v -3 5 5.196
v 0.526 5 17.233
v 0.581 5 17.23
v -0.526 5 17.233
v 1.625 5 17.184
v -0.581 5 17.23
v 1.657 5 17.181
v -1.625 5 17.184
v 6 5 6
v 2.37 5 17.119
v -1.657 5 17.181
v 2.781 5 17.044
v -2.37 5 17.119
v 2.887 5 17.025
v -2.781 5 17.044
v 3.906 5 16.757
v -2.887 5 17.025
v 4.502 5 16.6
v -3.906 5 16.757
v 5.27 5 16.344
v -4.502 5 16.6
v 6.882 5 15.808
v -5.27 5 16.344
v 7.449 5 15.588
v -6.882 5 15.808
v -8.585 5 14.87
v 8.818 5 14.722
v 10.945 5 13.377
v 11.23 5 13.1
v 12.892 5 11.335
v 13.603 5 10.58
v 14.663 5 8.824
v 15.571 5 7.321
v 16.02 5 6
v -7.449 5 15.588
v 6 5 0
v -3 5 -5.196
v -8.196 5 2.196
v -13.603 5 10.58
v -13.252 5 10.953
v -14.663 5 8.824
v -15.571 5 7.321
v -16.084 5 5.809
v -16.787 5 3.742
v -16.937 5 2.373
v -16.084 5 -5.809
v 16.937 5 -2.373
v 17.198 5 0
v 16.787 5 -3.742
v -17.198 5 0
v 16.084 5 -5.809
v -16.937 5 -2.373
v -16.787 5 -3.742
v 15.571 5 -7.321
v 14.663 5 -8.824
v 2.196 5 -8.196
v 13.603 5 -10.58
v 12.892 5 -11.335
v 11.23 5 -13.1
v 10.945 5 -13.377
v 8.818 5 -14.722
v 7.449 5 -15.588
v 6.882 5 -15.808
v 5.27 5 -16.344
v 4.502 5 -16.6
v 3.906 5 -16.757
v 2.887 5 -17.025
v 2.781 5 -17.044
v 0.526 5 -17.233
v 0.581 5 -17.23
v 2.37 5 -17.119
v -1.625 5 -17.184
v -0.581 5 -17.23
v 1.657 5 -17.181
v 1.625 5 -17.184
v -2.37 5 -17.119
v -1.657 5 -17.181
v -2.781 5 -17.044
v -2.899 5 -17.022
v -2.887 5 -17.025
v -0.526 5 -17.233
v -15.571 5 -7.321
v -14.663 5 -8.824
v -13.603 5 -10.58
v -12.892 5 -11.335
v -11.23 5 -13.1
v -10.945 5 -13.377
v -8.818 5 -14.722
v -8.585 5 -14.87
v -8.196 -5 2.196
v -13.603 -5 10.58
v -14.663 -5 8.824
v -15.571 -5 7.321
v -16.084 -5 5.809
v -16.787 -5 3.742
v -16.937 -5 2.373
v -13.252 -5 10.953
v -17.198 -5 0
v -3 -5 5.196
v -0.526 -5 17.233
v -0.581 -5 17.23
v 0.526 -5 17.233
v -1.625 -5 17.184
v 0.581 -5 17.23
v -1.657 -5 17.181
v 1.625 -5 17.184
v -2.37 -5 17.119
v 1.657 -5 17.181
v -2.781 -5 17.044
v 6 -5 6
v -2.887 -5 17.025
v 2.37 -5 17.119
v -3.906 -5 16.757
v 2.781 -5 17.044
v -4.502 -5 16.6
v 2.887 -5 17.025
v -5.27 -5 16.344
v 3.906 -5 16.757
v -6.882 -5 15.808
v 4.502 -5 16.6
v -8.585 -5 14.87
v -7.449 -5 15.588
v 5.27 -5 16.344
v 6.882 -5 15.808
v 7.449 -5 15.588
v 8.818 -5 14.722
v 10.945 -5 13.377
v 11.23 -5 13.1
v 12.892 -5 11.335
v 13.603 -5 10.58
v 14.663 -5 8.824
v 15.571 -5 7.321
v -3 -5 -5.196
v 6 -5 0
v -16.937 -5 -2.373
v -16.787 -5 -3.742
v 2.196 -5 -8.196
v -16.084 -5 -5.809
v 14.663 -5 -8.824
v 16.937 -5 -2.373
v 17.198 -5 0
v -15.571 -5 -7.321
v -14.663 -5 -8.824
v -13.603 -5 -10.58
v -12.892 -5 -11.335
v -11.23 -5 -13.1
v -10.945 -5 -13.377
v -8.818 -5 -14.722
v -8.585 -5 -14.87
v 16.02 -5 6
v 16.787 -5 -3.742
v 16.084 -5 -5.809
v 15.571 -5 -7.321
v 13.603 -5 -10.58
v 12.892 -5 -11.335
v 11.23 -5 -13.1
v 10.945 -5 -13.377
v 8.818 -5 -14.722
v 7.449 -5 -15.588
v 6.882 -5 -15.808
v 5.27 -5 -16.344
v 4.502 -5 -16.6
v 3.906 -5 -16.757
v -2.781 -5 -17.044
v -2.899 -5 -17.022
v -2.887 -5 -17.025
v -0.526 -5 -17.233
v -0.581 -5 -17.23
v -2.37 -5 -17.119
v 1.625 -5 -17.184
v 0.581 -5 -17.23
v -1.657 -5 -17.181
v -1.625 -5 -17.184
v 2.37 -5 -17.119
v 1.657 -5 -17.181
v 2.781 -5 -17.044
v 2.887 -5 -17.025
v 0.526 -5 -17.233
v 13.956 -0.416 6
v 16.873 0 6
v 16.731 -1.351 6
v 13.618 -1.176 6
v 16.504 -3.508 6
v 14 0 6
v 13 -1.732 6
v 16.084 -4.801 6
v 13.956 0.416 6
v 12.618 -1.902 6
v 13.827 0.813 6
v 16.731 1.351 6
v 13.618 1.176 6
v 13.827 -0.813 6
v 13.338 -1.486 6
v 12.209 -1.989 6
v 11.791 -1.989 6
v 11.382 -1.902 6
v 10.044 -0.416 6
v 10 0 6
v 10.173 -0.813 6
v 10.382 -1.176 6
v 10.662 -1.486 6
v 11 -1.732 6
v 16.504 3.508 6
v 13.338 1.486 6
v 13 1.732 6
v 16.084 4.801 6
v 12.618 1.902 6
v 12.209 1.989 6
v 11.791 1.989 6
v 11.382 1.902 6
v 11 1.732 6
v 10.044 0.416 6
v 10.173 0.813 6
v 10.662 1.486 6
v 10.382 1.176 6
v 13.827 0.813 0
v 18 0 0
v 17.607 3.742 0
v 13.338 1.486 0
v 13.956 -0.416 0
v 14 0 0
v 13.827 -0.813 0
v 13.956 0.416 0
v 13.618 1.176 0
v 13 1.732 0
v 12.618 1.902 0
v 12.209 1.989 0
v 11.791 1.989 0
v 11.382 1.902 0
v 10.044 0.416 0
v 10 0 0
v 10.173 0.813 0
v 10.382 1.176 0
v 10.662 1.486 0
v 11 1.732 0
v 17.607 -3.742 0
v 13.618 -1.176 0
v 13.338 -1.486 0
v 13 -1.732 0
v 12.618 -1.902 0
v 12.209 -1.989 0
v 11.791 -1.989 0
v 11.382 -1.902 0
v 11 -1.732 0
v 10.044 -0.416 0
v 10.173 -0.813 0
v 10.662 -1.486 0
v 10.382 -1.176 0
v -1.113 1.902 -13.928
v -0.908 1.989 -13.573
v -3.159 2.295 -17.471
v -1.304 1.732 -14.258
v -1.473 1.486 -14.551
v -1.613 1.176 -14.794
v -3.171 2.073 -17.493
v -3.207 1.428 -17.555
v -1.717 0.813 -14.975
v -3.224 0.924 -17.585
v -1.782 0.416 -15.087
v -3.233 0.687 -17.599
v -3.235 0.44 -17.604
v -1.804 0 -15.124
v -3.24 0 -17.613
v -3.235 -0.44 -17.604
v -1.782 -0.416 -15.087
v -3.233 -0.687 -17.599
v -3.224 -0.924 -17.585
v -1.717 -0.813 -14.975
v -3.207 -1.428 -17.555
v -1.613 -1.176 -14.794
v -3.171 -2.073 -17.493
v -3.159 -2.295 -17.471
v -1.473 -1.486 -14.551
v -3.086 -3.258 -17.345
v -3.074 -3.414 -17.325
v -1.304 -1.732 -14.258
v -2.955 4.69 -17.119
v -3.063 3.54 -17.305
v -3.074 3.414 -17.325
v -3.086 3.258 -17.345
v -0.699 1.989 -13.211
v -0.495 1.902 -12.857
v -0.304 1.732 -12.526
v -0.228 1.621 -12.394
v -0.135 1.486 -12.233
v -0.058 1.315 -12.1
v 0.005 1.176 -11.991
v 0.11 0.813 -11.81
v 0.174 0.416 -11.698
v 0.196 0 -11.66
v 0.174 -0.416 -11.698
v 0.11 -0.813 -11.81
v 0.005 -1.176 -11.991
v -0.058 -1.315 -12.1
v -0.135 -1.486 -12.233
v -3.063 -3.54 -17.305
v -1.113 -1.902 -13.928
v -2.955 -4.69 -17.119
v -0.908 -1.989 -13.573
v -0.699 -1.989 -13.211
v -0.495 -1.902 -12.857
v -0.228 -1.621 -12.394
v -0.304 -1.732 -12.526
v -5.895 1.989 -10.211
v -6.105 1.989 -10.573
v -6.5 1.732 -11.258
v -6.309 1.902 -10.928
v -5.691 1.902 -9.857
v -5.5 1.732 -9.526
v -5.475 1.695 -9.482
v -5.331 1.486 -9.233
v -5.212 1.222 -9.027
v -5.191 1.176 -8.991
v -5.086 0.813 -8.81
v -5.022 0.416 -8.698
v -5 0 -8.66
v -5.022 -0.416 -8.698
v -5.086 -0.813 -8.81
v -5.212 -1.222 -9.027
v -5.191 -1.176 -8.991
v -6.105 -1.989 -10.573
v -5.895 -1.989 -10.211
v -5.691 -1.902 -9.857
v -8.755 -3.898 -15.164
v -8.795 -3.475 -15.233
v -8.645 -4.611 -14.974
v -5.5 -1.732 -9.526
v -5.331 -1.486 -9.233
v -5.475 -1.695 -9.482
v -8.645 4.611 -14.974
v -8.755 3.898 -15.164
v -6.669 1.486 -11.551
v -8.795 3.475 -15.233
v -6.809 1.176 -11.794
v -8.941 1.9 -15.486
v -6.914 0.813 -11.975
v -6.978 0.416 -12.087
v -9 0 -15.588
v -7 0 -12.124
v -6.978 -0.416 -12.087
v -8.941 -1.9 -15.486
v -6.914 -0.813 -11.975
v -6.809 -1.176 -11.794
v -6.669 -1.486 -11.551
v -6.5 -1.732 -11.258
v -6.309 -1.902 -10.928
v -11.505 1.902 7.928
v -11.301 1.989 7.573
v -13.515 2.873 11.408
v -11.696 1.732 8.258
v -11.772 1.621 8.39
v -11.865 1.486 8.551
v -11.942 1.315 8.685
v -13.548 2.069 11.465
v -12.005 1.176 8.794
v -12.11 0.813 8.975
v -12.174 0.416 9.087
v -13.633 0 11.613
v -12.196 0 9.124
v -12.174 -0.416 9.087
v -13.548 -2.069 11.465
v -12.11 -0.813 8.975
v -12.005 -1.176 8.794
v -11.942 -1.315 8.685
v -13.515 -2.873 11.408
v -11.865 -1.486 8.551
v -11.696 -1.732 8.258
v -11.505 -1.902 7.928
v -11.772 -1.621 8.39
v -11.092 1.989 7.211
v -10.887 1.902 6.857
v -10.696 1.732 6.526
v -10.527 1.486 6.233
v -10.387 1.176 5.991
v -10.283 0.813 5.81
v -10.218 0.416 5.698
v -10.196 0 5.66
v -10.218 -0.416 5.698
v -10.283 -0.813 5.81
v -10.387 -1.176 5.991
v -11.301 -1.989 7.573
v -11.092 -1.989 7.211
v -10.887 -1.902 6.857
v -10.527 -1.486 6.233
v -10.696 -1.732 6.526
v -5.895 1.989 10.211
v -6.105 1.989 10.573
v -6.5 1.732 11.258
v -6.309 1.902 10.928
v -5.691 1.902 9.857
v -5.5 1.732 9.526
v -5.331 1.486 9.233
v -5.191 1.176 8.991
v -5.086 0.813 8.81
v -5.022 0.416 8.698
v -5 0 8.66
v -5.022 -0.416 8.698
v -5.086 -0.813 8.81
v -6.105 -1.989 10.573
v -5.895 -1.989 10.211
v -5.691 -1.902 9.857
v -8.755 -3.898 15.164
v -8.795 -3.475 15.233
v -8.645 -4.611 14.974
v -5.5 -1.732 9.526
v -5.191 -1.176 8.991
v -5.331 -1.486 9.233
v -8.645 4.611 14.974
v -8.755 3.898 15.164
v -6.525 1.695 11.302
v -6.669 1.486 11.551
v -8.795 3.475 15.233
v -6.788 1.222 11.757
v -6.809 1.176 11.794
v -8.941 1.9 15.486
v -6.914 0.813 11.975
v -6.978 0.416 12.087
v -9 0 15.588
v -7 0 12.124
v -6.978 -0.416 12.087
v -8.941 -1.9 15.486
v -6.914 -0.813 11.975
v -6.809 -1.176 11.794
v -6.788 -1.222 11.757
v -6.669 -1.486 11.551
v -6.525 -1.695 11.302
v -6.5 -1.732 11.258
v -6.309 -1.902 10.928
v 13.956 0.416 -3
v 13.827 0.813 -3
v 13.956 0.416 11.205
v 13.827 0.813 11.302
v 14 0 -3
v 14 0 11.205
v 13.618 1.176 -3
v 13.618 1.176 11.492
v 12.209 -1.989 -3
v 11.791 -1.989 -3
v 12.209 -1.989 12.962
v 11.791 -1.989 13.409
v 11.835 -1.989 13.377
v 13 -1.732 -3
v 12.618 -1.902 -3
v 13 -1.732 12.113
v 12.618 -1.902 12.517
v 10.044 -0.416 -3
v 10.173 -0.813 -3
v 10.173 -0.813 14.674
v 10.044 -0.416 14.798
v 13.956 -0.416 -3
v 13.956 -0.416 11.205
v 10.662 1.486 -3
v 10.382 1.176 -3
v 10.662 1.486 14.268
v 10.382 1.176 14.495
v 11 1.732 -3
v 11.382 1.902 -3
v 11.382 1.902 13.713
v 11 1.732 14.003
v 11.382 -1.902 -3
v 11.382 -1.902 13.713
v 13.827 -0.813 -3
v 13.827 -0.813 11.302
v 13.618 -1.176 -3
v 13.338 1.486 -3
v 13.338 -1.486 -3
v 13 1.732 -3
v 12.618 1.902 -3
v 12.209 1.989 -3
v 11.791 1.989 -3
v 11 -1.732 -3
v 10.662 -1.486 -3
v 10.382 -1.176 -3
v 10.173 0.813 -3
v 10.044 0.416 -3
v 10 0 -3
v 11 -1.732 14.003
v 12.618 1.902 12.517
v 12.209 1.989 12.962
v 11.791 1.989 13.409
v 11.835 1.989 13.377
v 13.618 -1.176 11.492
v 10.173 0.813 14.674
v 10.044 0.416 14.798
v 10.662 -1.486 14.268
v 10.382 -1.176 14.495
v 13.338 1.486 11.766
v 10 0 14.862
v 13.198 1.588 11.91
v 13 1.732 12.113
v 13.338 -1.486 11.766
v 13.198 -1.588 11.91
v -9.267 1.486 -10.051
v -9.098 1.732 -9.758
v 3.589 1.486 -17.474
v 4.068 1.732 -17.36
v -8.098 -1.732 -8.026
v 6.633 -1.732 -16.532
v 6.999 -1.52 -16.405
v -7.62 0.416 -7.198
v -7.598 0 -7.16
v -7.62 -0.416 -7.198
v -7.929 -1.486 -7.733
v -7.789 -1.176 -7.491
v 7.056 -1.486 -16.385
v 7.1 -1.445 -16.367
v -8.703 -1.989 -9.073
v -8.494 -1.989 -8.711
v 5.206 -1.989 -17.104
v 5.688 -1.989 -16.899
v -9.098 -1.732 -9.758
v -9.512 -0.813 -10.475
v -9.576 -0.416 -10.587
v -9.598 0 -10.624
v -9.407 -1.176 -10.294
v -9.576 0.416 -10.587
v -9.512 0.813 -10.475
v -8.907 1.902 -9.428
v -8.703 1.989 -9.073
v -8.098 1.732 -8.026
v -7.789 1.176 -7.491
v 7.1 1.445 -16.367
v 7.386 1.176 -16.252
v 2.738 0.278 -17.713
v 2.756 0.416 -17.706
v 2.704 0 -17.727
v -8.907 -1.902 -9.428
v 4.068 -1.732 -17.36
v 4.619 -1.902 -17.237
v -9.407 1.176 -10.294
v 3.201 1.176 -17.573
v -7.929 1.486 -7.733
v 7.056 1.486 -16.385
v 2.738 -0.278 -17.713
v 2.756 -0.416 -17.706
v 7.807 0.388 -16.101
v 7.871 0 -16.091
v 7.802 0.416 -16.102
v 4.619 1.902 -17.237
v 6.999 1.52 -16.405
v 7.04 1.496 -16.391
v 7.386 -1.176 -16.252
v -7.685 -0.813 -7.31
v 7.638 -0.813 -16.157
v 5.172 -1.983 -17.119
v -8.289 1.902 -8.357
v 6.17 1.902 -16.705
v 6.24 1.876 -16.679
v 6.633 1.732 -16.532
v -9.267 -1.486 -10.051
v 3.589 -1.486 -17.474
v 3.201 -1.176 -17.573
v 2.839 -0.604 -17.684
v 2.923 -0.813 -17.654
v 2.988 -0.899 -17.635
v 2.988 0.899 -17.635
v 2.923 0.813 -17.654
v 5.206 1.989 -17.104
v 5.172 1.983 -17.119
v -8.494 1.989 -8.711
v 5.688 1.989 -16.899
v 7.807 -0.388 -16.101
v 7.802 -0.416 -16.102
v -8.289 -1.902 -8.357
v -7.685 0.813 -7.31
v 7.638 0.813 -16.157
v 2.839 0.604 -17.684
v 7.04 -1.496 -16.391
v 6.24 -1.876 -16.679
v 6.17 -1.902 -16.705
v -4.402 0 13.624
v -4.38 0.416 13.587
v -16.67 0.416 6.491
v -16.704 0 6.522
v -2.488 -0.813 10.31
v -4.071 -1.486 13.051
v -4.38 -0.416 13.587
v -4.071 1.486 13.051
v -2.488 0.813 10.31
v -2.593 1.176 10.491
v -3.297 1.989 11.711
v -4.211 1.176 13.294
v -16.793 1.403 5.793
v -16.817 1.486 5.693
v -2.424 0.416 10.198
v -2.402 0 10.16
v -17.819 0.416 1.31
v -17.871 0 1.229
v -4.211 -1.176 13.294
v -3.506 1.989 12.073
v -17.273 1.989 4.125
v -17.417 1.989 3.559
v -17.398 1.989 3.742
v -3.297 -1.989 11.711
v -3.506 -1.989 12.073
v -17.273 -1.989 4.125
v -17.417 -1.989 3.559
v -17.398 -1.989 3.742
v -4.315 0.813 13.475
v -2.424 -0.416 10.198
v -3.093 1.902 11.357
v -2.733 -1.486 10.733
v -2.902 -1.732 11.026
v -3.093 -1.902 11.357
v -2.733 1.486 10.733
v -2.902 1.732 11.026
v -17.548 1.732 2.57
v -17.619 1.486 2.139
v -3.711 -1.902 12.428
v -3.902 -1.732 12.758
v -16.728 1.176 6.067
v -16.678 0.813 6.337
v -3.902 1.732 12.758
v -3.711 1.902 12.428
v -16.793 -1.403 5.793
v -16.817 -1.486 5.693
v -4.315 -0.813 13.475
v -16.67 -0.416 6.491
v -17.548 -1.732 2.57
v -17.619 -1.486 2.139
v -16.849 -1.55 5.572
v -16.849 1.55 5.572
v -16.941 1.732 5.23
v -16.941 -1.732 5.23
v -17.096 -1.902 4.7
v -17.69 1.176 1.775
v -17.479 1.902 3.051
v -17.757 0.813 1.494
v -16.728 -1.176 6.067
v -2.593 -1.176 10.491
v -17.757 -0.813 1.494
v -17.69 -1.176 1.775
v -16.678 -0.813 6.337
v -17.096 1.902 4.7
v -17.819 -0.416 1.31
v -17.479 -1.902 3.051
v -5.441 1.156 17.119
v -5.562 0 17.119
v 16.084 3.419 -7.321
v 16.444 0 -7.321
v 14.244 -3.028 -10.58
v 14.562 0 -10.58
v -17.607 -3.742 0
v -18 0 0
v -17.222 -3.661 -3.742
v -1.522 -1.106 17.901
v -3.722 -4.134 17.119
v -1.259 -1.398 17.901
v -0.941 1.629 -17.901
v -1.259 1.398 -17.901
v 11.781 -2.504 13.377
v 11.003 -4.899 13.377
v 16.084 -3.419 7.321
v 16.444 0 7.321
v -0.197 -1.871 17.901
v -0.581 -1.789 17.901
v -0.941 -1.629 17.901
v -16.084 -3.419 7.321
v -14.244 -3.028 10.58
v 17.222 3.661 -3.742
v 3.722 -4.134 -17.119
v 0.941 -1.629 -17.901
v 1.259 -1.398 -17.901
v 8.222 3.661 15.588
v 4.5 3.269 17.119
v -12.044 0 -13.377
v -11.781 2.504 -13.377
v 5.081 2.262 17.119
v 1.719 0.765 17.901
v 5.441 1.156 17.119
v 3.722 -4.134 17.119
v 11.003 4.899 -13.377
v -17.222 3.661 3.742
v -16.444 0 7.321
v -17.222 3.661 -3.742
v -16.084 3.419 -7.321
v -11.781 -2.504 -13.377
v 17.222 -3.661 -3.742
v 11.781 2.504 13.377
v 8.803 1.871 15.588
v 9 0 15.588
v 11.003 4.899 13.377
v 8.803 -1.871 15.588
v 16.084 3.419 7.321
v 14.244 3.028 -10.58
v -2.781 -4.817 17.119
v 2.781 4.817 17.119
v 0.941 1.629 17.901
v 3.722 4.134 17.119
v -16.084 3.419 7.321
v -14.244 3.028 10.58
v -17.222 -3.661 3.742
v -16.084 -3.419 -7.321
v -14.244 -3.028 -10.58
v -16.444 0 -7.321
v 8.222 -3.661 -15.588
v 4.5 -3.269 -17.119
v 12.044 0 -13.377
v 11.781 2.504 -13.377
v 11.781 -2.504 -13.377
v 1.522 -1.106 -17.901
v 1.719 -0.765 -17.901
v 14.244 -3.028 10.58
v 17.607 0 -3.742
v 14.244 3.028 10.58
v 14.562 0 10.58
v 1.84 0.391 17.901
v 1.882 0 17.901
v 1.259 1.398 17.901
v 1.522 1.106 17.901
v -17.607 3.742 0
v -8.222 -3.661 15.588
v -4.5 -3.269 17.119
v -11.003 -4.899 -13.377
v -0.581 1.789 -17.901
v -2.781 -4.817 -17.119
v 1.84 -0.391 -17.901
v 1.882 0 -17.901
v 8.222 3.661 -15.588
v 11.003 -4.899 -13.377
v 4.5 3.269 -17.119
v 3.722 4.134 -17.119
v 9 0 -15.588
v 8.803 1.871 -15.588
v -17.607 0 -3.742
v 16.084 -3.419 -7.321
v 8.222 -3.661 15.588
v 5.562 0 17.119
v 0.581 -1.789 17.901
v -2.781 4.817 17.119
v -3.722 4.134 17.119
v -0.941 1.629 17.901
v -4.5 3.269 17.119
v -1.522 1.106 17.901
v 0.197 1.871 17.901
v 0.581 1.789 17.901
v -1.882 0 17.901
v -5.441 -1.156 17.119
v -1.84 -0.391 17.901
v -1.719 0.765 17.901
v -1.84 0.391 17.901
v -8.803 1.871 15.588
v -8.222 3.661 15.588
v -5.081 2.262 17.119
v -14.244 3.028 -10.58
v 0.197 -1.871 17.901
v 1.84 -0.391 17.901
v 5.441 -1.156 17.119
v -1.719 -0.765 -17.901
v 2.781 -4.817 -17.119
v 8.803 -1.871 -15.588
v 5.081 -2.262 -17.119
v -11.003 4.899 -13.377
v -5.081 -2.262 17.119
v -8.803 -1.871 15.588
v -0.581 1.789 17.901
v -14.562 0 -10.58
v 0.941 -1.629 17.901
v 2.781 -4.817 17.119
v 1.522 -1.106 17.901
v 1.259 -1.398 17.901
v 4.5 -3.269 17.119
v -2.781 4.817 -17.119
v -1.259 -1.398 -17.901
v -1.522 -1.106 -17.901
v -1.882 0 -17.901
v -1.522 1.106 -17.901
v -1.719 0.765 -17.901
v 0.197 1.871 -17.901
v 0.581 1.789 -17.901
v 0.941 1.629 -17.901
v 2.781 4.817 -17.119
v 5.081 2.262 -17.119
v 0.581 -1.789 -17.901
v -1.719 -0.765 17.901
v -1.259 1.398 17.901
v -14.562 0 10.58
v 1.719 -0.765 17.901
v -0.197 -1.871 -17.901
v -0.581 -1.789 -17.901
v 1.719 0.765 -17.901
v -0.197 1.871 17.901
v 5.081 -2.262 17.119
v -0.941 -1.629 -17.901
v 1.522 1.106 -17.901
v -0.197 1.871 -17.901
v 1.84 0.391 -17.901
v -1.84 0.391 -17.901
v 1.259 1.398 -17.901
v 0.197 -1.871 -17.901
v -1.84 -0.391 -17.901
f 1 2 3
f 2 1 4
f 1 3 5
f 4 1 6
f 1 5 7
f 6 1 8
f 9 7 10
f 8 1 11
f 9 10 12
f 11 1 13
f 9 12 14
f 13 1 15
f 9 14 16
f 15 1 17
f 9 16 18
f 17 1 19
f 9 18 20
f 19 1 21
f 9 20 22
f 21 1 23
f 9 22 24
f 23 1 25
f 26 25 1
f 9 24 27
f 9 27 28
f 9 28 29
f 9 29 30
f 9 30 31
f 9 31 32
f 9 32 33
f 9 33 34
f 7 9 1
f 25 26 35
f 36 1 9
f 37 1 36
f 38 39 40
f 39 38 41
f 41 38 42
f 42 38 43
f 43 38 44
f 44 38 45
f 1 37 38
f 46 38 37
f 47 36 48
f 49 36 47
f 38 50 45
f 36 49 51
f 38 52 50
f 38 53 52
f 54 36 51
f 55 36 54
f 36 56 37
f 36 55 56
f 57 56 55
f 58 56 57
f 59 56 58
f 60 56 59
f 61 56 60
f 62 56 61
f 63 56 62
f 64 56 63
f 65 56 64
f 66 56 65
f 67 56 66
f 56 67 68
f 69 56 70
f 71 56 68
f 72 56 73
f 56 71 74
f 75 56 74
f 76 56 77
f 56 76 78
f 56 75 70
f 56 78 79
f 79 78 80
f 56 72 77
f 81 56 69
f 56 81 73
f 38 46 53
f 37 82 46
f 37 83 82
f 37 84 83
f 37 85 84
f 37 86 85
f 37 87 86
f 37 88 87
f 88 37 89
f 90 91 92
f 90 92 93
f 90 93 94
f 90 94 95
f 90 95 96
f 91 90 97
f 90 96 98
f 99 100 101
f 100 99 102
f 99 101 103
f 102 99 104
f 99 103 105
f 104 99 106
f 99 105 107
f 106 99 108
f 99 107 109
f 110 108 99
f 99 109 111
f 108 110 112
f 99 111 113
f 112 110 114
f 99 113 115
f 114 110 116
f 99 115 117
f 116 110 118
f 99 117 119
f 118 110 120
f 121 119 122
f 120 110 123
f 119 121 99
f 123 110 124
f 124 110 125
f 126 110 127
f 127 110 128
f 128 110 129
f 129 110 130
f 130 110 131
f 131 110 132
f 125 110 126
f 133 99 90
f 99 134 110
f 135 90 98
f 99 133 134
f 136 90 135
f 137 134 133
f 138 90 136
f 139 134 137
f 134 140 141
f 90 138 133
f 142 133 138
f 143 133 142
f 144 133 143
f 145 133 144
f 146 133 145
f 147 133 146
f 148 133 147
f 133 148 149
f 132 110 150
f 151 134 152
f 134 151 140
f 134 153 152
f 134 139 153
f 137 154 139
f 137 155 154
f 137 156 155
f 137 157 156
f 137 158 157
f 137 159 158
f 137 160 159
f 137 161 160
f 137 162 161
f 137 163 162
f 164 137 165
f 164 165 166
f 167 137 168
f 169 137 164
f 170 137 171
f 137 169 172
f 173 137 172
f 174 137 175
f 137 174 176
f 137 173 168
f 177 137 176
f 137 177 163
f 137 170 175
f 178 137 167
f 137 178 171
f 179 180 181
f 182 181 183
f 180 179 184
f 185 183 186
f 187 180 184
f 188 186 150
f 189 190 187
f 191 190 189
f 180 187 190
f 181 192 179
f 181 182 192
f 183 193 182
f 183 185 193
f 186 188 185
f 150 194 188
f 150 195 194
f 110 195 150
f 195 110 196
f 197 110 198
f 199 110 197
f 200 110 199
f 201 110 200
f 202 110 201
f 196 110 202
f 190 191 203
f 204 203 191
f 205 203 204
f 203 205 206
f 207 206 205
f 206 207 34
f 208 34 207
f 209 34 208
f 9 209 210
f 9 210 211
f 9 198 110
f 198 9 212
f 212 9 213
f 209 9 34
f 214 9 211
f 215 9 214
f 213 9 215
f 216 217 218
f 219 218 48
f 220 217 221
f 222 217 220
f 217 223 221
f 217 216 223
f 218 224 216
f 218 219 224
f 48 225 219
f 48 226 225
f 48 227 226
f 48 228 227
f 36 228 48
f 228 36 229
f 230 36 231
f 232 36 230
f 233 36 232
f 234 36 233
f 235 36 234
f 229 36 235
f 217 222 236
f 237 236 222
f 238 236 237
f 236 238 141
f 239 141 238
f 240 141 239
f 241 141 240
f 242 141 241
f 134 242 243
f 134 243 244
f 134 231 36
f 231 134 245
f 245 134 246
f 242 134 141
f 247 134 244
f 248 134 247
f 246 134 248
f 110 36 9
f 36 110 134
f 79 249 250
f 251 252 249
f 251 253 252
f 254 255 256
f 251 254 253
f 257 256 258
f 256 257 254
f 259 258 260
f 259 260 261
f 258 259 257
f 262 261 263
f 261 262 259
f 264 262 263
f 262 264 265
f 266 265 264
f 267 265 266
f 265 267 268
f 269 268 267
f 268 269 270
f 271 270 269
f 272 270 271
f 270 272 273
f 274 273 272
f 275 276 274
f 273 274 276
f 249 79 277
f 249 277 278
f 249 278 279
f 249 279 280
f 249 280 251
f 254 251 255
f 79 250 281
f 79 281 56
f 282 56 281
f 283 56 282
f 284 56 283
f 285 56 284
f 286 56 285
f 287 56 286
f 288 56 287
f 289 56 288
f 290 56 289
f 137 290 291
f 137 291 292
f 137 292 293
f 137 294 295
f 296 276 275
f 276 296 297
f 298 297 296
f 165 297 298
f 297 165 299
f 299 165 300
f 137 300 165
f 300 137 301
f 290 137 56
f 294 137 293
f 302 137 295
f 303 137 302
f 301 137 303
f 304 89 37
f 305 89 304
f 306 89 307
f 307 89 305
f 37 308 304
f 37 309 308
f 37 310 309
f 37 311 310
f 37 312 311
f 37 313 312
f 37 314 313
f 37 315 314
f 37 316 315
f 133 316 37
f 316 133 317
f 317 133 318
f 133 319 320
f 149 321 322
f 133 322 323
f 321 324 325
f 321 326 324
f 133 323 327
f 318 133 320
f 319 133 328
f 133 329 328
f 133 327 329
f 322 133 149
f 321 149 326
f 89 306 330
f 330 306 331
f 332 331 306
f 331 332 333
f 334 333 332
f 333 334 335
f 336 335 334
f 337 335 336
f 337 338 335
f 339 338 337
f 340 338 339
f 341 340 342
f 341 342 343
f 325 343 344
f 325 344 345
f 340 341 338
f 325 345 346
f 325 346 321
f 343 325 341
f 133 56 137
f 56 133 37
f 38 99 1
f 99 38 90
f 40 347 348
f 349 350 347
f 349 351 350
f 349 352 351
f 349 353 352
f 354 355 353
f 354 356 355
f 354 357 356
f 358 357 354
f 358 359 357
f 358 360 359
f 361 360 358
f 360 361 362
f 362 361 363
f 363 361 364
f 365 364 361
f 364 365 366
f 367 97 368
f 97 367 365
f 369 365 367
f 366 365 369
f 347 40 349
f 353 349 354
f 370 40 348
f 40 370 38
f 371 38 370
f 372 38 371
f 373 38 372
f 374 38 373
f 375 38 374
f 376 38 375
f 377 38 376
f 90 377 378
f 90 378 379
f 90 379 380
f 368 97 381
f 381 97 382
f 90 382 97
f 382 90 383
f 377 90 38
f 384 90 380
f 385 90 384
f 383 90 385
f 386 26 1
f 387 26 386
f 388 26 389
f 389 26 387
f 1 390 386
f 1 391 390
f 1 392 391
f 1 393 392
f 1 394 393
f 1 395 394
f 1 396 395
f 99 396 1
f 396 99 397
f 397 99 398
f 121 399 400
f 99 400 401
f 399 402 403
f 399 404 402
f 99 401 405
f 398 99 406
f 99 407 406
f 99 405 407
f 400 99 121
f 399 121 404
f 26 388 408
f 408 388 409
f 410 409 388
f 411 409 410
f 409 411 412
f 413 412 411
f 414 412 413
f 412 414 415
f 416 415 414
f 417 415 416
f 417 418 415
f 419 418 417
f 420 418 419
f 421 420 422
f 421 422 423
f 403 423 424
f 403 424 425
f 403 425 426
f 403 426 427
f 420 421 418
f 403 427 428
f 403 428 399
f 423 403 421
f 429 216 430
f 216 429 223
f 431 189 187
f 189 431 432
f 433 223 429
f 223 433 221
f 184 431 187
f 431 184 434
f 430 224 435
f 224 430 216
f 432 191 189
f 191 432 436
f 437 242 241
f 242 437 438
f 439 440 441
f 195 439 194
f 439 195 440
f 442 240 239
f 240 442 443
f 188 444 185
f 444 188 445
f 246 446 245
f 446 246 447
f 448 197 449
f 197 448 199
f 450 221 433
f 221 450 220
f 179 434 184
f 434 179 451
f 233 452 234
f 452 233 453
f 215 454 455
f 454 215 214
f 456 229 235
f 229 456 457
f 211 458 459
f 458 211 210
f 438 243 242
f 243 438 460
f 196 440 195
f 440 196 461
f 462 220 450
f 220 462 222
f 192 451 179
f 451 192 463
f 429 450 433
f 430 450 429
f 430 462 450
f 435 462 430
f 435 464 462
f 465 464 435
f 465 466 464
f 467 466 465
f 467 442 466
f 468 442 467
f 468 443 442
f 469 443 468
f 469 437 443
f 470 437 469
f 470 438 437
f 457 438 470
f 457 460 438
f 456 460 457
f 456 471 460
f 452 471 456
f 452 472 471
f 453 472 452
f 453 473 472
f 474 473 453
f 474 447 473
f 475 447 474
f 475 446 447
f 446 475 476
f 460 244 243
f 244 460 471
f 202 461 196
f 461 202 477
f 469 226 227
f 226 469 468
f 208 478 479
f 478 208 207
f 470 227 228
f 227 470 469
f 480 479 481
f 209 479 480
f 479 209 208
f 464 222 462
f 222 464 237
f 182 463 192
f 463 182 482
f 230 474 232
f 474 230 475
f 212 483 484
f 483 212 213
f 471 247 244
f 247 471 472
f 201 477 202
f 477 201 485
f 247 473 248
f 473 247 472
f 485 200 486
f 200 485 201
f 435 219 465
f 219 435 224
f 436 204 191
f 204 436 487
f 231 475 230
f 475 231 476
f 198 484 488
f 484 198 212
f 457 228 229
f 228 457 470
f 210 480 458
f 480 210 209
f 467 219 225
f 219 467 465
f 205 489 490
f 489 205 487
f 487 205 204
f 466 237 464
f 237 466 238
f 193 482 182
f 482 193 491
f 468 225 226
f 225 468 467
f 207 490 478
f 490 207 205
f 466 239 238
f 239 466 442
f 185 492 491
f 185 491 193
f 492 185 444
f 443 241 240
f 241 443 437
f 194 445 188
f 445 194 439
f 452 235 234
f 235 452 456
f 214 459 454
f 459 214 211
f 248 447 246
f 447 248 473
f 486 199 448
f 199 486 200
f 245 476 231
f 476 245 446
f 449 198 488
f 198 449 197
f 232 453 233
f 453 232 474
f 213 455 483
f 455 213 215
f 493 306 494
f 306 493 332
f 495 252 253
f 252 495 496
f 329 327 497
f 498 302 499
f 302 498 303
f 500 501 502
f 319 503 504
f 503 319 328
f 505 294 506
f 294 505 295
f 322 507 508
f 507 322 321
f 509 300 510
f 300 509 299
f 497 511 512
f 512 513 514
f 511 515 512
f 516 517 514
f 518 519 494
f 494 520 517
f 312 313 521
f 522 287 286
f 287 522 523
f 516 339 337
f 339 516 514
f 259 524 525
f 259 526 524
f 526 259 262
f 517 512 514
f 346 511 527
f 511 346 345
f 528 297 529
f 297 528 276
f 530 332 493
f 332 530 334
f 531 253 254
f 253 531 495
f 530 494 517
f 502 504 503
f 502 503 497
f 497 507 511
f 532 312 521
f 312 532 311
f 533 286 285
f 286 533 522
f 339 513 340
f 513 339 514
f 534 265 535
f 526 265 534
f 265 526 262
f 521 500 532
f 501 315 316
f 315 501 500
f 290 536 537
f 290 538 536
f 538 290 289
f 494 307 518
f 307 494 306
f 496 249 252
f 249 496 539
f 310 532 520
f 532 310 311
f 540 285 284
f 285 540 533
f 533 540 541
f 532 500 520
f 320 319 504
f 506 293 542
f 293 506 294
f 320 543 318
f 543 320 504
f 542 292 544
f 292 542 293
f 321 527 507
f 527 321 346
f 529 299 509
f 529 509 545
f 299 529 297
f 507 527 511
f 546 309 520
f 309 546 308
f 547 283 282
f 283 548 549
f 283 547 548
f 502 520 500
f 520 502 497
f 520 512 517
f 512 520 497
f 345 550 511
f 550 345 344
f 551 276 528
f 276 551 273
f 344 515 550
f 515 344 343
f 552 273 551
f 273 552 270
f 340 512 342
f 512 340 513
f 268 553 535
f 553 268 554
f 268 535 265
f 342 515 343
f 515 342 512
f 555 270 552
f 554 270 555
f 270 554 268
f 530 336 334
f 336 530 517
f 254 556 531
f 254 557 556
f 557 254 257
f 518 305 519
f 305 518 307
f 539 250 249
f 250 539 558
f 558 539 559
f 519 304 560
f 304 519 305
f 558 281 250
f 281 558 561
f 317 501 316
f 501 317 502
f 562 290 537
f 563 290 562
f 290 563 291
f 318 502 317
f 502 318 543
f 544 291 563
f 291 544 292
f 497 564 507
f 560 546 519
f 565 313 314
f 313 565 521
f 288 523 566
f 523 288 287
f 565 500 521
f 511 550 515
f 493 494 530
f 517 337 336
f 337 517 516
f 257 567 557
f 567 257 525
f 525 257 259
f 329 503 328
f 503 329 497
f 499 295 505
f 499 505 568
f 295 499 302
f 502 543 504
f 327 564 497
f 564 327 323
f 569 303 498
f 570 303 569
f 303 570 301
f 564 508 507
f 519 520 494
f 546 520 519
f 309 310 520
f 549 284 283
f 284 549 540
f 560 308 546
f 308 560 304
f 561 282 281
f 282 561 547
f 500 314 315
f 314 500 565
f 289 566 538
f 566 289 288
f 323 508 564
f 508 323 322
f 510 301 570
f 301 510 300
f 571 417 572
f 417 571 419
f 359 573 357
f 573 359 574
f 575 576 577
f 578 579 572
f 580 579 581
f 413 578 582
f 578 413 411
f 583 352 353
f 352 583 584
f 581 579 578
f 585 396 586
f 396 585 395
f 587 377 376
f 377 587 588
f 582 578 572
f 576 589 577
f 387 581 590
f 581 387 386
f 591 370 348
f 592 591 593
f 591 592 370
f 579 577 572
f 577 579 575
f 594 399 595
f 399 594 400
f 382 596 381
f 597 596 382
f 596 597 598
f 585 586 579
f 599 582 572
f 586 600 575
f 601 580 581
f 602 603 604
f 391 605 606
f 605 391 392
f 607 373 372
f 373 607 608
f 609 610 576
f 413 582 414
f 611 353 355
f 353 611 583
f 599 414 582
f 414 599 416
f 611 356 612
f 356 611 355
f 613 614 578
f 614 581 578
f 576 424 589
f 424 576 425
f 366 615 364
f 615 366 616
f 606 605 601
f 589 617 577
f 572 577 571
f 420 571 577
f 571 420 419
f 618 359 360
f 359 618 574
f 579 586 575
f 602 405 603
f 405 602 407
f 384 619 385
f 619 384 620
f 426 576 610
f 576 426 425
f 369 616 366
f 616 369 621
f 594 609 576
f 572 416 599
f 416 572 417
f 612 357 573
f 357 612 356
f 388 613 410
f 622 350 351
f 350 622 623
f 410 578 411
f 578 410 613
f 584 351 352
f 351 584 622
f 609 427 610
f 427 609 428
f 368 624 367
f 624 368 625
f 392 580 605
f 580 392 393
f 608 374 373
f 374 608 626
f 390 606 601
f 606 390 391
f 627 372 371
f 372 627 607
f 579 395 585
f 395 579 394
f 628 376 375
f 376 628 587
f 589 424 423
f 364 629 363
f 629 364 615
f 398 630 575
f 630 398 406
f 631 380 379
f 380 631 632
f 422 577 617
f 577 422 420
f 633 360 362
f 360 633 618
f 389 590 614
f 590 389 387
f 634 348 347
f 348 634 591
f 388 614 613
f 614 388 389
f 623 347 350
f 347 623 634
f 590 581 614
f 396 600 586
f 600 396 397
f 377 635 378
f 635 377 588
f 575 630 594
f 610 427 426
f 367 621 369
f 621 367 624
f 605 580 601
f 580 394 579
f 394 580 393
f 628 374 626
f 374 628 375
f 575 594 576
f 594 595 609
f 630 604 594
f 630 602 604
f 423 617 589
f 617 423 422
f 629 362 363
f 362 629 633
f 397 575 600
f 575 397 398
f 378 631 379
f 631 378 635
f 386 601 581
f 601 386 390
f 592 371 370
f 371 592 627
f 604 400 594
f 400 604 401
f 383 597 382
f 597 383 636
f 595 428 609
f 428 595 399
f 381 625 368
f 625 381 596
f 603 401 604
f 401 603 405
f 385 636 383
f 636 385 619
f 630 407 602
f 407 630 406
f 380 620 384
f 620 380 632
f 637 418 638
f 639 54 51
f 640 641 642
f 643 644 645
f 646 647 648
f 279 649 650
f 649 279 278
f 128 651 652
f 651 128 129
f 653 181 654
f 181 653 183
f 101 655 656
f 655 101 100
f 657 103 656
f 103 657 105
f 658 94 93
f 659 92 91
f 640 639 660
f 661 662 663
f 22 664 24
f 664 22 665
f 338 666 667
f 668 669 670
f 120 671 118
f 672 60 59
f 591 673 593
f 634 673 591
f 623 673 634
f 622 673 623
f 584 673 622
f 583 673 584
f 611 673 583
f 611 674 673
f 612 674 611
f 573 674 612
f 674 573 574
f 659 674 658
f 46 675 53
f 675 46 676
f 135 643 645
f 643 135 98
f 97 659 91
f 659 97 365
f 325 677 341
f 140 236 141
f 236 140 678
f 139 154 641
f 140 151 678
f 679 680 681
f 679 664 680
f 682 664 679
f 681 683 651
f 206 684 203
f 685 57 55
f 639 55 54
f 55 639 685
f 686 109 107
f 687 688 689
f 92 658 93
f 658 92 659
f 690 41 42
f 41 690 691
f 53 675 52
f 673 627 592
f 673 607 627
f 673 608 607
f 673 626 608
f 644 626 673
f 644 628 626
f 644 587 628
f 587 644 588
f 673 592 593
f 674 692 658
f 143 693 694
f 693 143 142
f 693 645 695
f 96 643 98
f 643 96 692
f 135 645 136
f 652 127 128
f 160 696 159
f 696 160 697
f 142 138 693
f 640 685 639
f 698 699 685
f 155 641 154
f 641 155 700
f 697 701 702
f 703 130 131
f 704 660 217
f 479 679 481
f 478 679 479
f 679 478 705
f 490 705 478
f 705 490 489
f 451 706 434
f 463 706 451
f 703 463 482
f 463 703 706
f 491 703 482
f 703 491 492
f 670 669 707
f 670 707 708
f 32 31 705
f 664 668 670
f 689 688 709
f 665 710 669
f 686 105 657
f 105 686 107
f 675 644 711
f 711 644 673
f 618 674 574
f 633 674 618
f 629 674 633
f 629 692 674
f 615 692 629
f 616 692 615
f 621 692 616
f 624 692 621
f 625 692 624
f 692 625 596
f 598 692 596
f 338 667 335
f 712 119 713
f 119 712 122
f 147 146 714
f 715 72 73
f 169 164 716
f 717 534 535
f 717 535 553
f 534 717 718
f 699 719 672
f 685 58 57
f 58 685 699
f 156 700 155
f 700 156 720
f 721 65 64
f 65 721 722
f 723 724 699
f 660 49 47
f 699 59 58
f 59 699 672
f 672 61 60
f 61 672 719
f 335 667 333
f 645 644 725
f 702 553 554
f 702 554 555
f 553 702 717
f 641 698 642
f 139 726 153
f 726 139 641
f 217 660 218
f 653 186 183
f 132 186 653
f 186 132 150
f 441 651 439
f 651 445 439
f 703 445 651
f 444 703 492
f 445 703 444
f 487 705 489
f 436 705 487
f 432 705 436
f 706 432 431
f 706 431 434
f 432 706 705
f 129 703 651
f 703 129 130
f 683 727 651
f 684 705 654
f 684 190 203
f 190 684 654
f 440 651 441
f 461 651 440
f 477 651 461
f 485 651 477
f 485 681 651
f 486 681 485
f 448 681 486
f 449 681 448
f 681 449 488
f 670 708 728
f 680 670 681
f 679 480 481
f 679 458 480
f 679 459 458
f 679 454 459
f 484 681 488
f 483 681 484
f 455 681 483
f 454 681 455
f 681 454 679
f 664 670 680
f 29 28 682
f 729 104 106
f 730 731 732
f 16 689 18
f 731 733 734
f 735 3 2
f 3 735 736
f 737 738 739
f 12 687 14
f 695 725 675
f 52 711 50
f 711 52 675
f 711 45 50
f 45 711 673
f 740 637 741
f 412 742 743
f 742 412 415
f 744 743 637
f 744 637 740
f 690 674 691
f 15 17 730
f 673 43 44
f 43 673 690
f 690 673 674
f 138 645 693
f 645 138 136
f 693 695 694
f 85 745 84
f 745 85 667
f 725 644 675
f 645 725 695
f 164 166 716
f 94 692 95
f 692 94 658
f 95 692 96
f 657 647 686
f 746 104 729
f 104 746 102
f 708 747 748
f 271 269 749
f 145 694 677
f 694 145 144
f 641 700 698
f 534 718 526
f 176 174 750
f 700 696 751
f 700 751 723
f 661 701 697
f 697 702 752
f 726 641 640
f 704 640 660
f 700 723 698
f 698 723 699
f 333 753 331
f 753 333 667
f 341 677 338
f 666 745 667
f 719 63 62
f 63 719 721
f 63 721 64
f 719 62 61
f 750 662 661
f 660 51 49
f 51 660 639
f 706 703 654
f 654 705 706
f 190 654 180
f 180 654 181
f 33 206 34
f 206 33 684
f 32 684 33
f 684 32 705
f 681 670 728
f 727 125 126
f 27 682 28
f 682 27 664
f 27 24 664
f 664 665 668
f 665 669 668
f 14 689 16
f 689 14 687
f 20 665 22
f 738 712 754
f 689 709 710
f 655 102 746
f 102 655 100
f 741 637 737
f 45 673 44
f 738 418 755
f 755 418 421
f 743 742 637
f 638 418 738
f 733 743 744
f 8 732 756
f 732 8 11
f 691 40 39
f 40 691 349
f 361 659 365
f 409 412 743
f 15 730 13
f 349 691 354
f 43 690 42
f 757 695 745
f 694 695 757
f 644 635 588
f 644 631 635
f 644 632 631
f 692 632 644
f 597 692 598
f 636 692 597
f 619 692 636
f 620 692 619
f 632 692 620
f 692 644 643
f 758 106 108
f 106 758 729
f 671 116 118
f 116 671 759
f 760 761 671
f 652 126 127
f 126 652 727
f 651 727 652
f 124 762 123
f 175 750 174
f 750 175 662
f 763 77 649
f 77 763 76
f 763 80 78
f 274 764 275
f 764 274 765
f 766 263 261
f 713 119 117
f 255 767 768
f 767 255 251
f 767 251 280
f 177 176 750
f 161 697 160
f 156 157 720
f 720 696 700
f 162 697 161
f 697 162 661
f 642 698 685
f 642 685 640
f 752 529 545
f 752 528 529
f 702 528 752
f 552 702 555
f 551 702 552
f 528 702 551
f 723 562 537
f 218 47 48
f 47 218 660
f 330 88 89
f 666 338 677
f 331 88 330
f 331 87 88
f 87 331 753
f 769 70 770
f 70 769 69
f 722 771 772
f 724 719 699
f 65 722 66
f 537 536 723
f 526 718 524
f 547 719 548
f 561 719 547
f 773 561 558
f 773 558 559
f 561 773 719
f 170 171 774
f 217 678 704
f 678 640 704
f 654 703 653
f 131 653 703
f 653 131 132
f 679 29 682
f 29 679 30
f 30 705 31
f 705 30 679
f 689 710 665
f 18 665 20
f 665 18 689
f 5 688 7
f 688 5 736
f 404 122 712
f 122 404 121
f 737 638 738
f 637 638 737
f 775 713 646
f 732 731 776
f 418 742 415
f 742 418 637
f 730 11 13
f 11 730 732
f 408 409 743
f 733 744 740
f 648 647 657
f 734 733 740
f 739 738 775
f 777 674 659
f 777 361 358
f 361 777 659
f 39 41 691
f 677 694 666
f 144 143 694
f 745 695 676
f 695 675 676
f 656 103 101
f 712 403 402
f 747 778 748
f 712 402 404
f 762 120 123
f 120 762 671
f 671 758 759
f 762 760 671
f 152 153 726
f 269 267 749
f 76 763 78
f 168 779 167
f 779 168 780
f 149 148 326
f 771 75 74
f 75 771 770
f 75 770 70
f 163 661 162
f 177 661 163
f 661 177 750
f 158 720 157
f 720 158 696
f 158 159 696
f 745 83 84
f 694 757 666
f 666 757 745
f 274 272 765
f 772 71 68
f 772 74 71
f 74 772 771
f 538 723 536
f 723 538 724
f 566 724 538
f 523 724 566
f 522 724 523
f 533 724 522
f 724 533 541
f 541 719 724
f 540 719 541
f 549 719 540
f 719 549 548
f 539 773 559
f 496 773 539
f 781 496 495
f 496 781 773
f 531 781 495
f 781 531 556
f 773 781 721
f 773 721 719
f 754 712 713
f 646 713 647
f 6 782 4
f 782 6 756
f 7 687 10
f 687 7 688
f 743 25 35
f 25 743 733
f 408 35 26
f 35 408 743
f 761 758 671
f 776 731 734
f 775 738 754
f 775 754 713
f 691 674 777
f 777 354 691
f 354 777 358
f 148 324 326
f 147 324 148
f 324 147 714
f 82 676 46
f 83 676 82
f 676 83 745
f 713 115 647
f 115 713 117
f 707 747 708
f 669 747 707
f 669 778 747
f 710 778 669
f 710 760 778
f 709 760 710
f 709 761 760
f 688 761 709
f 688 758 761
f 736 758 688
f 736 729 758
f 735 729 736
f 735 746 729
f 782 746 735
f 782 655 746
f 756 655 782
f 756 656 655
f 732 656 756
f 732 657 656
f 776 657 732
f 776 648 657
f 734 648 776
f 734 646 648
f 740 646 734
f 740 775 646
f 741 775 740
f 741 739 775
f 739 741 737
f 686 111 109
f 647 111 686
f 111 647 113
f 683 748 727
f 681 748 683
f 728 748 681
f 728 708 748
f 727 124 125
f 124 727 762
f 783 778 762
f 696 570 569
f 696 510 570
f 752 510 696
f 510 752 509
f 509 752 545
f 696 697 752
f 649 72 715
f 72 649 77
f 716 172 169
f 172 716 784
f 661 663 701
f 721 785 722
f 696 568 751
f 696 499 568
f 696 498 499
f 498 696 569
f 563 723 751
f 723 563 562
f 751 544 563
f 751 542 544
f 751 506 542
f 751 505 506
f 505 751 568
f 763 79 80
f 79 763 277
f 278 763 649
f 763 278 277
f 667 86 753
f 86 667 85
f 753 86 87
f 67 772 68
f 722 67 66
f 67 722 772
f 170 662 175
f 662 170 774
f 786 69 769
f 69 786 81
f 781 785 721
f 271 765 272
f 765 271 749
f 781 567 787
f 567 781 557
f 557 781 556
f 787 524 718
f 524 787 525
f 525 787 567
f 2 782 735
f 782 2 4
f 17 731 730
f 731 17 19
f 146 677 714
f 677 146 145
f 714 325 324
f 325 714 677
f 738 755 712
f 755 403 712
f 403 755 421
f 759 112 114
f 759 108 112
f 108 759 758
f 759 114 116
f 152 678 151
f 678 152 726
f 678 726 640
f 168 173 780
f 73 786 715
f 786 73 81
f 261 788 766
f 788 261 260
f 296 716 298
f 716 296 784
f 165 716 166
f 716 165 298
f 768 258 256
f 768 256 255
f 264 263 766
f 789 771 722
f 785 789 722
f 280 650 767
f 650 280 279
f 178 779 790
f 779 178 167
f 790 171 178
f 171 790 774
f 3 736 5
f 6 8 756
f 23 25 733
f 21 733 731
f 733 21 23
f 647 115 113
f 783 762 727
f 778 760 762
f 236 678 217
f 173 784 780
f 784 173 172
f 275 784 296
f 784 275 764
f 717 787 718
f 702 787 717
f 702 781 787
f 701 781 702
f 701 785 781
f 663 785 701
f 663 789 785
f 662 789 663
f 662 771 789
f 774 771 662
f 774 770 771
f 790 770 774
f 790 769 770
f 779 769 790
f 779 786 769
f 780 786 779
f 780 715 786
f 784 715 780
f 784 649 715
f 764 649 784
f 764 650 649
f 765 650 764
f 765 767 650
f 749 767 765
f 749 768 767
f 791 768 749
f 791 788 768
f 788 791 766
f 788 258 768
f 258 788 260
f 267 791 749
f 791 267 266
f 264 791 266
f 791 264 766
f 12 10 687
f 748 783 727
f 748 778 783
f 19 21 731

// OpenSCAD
$fn = 30;
ouverture = ((2 * ($t < 0.5 ? $t : 1 - $t) * 100) % 120) + 40;
angle=22.5;

l=54.19;
L=67.46;
delta=1.19;

m=53;
M=66.25;
mM=116.98;

epaisseur=6;
jepaisseur=10;

dec=sin(angle)*M;

/*
 * Calcul du rayon.
 */
ci = cos(ouverture/2) * M + 2 * epaisseur;
cy = cos(ouverture/2) * m;
/* Théorème d'Al-Kashi */
iy = sqrt(ci*ci + cy*cy - 2 * ci * cy * cos(180 - angle));
r=(iy / 2) / sin(angle / 2);
r_ex=r+sin(ouverture/2) * M - jepaisseur / 2;
r_in=r-sin(ouverture/2) * M - jepaisseur / 2;
echo (r);
echo (iy, mM);

module master2d() {
    translate([-1.19, 6])
    difference() {
        union() {
            difference() {
                union() {
                    translate([0, -12]) square([l, 12]);
                    translate([l, -6]) circle(d=12);
                }
                
                translate([l, -6]) circle(d=4);
            }
            
            rotate(angle) {
                difference() {
                    union() {
                        translate([-L, -12]) square([L, 12]);
                        translate([-L, -6]) circle(d=12);
                    }
                
                    translate([-L, -6]) circle(d=4);
                }
            }
        }
        
        translate([delta, -6]) circle(d=4);
    }
}

module master3d() {
    linear_extrude(height=epaisseur) master2d();
}

module master3d_op() {
    translate([0, 0, epaisseur]) rotate([0, 180, 0]) master3d();
}

module jonction4() {
    rotate([90, 0, 0])
    translate([0,0,-jepaisseur/2])
    difference() {
        union() {
            cube([3*epaisseur, epaisseur, jepaisseur]);
            
            translate([0, -2*epaisseur, 0])
                cube([3*epaisseur, epaisseur, jepaisseur]);
            translate([-3*epaisseur, -epaisseur, 0])
                cube([4*epaisseur, epaisseur, jepaisseur]);
            translate([-3*epaisseur,  epaisseur, 0])
                cube([3*epaisseur, epaisseur, jepaisseur]);

            translate([-epaisseur, 0,0])
                cube([epaisseur,3*epaisseur,jepaisseur]);
            translate([epaisseur, 0,0])
                cube([epaisseur,3*epaisseur,jepaisseur]);
            translate([-2*epaisseur, -3*epaisseur,0])
                cube([epaisseur,3*epaisseur,jepaisseur]);
            translate([0, -3*epaisseur,0])
                cube([epaisseur,3*epaisseur,jepaisseur]);
        }
        
        translate([2*epaisseur,epaisseur/2, jepaisseur/2]) rotate([90,0,0])
            cylinder(h=20, r=2);
        translate([-2*epaisseur,20-epaisseur/2, jepaisseur/2]) rotate([90,0,0])
            cylinder(h=20, r=2);
        
        translate([-epaisseur/2,2*epaisseur, jepaisseur/2]) rotate([0,90,0])
            cylinder(h=20, r=2);
        translate([-20+epaisseur/2,-2*epaisseur, jepaisseur/2]) rotate([0,90,0])
            cylinder(h=20, r=2);
    }
}

module jonction3() {
    intersection() {
        difference() {
            cube([6*epaisseur, jepaisseur, 6*epaisseur], center=true);
            
            translate([epaisseur, -jepaisseur, 0])
                cube([4*epaisseur, 2*jepaisseur, epaisseur]);
            rotate([0, 120, 0]) 
            
            translate([epaisseur, -jepaisseur, 0])
                cube([4*epaisseur, 2*jepaisseur, epaisseur]);
            
            rotate([0, 240, 0]) 
            translate([epaisseur, -jepaisseur, 0])
                cube([4*epaisseur, 2*jepaisseur, epaisseur]);
            
            translate([2*epaisseur, 0, -epaisseur/2])
            cylinder(r=2, h=20);
            
            rotate([0, 120, 0])
            translate([2*epaisseur, 0, -epaisseur/2])
                cylinder(r=2, h=20);
            
            rotate([0, 240, 0])
            translate([2*epaisseur, 0, -epaisseur/2])
                cylinder(r=2, h=20);
        }

        sphere(r=3*epaisseur);
    }
}

module segment() {
    t=cos(ouverture/2)*(l-delta);
    
    translate([-t, 0, -epaisseur])
    rotate([0,0,-ouverture/2])
    {
        master3d();
        
        rotate([0, 0, ouverture])
        translate([0,0,epaisseur])
            master3d();
    }
    
    translate([t, 0, -epaisseur])
    rotate([0, 0, ouverture/2])
    {
        translate([0, 0, epaisseur]) master3d_op();
        translate([0, 0, 0]) rotate([0,0,-ouverture]) master3d_op();
    }
}

module expcircle(level=1) {
    for (i = [0:7]) {
        rotate([0,0,i*2*angle+angle]) translate([0,r, 0]) segment();
    }
    
    jonctions = (level == 1 ? [0:7] : (level == 2 ? [0,1,3,4,5,7] : [1:2:7]));
    
    for (i = jonctions) {
        rotate([0,0,i*2*angle]) translate([0,r_ex, 0]) jonction4();
        rotate([0,0,i*2*angle]) translate([0,r_in, 0]) rotate([0, 0, 180]) jonction4();
    }
    
    /*for (i = [0:7])
        #rotate([0,0,i*2*angle+angle]) translate([0, -1, 5]) cube([r, 2, 2]);
    %translate([0, 0, 6]) circle(r=r);*/
}

jonction3();

module expsphere() {
    expcircle();
    rotate([90,0,0]) expcircle(level=2);
    rotate([0,90,0]) expcircle(level=3);
}

//expsphere();
